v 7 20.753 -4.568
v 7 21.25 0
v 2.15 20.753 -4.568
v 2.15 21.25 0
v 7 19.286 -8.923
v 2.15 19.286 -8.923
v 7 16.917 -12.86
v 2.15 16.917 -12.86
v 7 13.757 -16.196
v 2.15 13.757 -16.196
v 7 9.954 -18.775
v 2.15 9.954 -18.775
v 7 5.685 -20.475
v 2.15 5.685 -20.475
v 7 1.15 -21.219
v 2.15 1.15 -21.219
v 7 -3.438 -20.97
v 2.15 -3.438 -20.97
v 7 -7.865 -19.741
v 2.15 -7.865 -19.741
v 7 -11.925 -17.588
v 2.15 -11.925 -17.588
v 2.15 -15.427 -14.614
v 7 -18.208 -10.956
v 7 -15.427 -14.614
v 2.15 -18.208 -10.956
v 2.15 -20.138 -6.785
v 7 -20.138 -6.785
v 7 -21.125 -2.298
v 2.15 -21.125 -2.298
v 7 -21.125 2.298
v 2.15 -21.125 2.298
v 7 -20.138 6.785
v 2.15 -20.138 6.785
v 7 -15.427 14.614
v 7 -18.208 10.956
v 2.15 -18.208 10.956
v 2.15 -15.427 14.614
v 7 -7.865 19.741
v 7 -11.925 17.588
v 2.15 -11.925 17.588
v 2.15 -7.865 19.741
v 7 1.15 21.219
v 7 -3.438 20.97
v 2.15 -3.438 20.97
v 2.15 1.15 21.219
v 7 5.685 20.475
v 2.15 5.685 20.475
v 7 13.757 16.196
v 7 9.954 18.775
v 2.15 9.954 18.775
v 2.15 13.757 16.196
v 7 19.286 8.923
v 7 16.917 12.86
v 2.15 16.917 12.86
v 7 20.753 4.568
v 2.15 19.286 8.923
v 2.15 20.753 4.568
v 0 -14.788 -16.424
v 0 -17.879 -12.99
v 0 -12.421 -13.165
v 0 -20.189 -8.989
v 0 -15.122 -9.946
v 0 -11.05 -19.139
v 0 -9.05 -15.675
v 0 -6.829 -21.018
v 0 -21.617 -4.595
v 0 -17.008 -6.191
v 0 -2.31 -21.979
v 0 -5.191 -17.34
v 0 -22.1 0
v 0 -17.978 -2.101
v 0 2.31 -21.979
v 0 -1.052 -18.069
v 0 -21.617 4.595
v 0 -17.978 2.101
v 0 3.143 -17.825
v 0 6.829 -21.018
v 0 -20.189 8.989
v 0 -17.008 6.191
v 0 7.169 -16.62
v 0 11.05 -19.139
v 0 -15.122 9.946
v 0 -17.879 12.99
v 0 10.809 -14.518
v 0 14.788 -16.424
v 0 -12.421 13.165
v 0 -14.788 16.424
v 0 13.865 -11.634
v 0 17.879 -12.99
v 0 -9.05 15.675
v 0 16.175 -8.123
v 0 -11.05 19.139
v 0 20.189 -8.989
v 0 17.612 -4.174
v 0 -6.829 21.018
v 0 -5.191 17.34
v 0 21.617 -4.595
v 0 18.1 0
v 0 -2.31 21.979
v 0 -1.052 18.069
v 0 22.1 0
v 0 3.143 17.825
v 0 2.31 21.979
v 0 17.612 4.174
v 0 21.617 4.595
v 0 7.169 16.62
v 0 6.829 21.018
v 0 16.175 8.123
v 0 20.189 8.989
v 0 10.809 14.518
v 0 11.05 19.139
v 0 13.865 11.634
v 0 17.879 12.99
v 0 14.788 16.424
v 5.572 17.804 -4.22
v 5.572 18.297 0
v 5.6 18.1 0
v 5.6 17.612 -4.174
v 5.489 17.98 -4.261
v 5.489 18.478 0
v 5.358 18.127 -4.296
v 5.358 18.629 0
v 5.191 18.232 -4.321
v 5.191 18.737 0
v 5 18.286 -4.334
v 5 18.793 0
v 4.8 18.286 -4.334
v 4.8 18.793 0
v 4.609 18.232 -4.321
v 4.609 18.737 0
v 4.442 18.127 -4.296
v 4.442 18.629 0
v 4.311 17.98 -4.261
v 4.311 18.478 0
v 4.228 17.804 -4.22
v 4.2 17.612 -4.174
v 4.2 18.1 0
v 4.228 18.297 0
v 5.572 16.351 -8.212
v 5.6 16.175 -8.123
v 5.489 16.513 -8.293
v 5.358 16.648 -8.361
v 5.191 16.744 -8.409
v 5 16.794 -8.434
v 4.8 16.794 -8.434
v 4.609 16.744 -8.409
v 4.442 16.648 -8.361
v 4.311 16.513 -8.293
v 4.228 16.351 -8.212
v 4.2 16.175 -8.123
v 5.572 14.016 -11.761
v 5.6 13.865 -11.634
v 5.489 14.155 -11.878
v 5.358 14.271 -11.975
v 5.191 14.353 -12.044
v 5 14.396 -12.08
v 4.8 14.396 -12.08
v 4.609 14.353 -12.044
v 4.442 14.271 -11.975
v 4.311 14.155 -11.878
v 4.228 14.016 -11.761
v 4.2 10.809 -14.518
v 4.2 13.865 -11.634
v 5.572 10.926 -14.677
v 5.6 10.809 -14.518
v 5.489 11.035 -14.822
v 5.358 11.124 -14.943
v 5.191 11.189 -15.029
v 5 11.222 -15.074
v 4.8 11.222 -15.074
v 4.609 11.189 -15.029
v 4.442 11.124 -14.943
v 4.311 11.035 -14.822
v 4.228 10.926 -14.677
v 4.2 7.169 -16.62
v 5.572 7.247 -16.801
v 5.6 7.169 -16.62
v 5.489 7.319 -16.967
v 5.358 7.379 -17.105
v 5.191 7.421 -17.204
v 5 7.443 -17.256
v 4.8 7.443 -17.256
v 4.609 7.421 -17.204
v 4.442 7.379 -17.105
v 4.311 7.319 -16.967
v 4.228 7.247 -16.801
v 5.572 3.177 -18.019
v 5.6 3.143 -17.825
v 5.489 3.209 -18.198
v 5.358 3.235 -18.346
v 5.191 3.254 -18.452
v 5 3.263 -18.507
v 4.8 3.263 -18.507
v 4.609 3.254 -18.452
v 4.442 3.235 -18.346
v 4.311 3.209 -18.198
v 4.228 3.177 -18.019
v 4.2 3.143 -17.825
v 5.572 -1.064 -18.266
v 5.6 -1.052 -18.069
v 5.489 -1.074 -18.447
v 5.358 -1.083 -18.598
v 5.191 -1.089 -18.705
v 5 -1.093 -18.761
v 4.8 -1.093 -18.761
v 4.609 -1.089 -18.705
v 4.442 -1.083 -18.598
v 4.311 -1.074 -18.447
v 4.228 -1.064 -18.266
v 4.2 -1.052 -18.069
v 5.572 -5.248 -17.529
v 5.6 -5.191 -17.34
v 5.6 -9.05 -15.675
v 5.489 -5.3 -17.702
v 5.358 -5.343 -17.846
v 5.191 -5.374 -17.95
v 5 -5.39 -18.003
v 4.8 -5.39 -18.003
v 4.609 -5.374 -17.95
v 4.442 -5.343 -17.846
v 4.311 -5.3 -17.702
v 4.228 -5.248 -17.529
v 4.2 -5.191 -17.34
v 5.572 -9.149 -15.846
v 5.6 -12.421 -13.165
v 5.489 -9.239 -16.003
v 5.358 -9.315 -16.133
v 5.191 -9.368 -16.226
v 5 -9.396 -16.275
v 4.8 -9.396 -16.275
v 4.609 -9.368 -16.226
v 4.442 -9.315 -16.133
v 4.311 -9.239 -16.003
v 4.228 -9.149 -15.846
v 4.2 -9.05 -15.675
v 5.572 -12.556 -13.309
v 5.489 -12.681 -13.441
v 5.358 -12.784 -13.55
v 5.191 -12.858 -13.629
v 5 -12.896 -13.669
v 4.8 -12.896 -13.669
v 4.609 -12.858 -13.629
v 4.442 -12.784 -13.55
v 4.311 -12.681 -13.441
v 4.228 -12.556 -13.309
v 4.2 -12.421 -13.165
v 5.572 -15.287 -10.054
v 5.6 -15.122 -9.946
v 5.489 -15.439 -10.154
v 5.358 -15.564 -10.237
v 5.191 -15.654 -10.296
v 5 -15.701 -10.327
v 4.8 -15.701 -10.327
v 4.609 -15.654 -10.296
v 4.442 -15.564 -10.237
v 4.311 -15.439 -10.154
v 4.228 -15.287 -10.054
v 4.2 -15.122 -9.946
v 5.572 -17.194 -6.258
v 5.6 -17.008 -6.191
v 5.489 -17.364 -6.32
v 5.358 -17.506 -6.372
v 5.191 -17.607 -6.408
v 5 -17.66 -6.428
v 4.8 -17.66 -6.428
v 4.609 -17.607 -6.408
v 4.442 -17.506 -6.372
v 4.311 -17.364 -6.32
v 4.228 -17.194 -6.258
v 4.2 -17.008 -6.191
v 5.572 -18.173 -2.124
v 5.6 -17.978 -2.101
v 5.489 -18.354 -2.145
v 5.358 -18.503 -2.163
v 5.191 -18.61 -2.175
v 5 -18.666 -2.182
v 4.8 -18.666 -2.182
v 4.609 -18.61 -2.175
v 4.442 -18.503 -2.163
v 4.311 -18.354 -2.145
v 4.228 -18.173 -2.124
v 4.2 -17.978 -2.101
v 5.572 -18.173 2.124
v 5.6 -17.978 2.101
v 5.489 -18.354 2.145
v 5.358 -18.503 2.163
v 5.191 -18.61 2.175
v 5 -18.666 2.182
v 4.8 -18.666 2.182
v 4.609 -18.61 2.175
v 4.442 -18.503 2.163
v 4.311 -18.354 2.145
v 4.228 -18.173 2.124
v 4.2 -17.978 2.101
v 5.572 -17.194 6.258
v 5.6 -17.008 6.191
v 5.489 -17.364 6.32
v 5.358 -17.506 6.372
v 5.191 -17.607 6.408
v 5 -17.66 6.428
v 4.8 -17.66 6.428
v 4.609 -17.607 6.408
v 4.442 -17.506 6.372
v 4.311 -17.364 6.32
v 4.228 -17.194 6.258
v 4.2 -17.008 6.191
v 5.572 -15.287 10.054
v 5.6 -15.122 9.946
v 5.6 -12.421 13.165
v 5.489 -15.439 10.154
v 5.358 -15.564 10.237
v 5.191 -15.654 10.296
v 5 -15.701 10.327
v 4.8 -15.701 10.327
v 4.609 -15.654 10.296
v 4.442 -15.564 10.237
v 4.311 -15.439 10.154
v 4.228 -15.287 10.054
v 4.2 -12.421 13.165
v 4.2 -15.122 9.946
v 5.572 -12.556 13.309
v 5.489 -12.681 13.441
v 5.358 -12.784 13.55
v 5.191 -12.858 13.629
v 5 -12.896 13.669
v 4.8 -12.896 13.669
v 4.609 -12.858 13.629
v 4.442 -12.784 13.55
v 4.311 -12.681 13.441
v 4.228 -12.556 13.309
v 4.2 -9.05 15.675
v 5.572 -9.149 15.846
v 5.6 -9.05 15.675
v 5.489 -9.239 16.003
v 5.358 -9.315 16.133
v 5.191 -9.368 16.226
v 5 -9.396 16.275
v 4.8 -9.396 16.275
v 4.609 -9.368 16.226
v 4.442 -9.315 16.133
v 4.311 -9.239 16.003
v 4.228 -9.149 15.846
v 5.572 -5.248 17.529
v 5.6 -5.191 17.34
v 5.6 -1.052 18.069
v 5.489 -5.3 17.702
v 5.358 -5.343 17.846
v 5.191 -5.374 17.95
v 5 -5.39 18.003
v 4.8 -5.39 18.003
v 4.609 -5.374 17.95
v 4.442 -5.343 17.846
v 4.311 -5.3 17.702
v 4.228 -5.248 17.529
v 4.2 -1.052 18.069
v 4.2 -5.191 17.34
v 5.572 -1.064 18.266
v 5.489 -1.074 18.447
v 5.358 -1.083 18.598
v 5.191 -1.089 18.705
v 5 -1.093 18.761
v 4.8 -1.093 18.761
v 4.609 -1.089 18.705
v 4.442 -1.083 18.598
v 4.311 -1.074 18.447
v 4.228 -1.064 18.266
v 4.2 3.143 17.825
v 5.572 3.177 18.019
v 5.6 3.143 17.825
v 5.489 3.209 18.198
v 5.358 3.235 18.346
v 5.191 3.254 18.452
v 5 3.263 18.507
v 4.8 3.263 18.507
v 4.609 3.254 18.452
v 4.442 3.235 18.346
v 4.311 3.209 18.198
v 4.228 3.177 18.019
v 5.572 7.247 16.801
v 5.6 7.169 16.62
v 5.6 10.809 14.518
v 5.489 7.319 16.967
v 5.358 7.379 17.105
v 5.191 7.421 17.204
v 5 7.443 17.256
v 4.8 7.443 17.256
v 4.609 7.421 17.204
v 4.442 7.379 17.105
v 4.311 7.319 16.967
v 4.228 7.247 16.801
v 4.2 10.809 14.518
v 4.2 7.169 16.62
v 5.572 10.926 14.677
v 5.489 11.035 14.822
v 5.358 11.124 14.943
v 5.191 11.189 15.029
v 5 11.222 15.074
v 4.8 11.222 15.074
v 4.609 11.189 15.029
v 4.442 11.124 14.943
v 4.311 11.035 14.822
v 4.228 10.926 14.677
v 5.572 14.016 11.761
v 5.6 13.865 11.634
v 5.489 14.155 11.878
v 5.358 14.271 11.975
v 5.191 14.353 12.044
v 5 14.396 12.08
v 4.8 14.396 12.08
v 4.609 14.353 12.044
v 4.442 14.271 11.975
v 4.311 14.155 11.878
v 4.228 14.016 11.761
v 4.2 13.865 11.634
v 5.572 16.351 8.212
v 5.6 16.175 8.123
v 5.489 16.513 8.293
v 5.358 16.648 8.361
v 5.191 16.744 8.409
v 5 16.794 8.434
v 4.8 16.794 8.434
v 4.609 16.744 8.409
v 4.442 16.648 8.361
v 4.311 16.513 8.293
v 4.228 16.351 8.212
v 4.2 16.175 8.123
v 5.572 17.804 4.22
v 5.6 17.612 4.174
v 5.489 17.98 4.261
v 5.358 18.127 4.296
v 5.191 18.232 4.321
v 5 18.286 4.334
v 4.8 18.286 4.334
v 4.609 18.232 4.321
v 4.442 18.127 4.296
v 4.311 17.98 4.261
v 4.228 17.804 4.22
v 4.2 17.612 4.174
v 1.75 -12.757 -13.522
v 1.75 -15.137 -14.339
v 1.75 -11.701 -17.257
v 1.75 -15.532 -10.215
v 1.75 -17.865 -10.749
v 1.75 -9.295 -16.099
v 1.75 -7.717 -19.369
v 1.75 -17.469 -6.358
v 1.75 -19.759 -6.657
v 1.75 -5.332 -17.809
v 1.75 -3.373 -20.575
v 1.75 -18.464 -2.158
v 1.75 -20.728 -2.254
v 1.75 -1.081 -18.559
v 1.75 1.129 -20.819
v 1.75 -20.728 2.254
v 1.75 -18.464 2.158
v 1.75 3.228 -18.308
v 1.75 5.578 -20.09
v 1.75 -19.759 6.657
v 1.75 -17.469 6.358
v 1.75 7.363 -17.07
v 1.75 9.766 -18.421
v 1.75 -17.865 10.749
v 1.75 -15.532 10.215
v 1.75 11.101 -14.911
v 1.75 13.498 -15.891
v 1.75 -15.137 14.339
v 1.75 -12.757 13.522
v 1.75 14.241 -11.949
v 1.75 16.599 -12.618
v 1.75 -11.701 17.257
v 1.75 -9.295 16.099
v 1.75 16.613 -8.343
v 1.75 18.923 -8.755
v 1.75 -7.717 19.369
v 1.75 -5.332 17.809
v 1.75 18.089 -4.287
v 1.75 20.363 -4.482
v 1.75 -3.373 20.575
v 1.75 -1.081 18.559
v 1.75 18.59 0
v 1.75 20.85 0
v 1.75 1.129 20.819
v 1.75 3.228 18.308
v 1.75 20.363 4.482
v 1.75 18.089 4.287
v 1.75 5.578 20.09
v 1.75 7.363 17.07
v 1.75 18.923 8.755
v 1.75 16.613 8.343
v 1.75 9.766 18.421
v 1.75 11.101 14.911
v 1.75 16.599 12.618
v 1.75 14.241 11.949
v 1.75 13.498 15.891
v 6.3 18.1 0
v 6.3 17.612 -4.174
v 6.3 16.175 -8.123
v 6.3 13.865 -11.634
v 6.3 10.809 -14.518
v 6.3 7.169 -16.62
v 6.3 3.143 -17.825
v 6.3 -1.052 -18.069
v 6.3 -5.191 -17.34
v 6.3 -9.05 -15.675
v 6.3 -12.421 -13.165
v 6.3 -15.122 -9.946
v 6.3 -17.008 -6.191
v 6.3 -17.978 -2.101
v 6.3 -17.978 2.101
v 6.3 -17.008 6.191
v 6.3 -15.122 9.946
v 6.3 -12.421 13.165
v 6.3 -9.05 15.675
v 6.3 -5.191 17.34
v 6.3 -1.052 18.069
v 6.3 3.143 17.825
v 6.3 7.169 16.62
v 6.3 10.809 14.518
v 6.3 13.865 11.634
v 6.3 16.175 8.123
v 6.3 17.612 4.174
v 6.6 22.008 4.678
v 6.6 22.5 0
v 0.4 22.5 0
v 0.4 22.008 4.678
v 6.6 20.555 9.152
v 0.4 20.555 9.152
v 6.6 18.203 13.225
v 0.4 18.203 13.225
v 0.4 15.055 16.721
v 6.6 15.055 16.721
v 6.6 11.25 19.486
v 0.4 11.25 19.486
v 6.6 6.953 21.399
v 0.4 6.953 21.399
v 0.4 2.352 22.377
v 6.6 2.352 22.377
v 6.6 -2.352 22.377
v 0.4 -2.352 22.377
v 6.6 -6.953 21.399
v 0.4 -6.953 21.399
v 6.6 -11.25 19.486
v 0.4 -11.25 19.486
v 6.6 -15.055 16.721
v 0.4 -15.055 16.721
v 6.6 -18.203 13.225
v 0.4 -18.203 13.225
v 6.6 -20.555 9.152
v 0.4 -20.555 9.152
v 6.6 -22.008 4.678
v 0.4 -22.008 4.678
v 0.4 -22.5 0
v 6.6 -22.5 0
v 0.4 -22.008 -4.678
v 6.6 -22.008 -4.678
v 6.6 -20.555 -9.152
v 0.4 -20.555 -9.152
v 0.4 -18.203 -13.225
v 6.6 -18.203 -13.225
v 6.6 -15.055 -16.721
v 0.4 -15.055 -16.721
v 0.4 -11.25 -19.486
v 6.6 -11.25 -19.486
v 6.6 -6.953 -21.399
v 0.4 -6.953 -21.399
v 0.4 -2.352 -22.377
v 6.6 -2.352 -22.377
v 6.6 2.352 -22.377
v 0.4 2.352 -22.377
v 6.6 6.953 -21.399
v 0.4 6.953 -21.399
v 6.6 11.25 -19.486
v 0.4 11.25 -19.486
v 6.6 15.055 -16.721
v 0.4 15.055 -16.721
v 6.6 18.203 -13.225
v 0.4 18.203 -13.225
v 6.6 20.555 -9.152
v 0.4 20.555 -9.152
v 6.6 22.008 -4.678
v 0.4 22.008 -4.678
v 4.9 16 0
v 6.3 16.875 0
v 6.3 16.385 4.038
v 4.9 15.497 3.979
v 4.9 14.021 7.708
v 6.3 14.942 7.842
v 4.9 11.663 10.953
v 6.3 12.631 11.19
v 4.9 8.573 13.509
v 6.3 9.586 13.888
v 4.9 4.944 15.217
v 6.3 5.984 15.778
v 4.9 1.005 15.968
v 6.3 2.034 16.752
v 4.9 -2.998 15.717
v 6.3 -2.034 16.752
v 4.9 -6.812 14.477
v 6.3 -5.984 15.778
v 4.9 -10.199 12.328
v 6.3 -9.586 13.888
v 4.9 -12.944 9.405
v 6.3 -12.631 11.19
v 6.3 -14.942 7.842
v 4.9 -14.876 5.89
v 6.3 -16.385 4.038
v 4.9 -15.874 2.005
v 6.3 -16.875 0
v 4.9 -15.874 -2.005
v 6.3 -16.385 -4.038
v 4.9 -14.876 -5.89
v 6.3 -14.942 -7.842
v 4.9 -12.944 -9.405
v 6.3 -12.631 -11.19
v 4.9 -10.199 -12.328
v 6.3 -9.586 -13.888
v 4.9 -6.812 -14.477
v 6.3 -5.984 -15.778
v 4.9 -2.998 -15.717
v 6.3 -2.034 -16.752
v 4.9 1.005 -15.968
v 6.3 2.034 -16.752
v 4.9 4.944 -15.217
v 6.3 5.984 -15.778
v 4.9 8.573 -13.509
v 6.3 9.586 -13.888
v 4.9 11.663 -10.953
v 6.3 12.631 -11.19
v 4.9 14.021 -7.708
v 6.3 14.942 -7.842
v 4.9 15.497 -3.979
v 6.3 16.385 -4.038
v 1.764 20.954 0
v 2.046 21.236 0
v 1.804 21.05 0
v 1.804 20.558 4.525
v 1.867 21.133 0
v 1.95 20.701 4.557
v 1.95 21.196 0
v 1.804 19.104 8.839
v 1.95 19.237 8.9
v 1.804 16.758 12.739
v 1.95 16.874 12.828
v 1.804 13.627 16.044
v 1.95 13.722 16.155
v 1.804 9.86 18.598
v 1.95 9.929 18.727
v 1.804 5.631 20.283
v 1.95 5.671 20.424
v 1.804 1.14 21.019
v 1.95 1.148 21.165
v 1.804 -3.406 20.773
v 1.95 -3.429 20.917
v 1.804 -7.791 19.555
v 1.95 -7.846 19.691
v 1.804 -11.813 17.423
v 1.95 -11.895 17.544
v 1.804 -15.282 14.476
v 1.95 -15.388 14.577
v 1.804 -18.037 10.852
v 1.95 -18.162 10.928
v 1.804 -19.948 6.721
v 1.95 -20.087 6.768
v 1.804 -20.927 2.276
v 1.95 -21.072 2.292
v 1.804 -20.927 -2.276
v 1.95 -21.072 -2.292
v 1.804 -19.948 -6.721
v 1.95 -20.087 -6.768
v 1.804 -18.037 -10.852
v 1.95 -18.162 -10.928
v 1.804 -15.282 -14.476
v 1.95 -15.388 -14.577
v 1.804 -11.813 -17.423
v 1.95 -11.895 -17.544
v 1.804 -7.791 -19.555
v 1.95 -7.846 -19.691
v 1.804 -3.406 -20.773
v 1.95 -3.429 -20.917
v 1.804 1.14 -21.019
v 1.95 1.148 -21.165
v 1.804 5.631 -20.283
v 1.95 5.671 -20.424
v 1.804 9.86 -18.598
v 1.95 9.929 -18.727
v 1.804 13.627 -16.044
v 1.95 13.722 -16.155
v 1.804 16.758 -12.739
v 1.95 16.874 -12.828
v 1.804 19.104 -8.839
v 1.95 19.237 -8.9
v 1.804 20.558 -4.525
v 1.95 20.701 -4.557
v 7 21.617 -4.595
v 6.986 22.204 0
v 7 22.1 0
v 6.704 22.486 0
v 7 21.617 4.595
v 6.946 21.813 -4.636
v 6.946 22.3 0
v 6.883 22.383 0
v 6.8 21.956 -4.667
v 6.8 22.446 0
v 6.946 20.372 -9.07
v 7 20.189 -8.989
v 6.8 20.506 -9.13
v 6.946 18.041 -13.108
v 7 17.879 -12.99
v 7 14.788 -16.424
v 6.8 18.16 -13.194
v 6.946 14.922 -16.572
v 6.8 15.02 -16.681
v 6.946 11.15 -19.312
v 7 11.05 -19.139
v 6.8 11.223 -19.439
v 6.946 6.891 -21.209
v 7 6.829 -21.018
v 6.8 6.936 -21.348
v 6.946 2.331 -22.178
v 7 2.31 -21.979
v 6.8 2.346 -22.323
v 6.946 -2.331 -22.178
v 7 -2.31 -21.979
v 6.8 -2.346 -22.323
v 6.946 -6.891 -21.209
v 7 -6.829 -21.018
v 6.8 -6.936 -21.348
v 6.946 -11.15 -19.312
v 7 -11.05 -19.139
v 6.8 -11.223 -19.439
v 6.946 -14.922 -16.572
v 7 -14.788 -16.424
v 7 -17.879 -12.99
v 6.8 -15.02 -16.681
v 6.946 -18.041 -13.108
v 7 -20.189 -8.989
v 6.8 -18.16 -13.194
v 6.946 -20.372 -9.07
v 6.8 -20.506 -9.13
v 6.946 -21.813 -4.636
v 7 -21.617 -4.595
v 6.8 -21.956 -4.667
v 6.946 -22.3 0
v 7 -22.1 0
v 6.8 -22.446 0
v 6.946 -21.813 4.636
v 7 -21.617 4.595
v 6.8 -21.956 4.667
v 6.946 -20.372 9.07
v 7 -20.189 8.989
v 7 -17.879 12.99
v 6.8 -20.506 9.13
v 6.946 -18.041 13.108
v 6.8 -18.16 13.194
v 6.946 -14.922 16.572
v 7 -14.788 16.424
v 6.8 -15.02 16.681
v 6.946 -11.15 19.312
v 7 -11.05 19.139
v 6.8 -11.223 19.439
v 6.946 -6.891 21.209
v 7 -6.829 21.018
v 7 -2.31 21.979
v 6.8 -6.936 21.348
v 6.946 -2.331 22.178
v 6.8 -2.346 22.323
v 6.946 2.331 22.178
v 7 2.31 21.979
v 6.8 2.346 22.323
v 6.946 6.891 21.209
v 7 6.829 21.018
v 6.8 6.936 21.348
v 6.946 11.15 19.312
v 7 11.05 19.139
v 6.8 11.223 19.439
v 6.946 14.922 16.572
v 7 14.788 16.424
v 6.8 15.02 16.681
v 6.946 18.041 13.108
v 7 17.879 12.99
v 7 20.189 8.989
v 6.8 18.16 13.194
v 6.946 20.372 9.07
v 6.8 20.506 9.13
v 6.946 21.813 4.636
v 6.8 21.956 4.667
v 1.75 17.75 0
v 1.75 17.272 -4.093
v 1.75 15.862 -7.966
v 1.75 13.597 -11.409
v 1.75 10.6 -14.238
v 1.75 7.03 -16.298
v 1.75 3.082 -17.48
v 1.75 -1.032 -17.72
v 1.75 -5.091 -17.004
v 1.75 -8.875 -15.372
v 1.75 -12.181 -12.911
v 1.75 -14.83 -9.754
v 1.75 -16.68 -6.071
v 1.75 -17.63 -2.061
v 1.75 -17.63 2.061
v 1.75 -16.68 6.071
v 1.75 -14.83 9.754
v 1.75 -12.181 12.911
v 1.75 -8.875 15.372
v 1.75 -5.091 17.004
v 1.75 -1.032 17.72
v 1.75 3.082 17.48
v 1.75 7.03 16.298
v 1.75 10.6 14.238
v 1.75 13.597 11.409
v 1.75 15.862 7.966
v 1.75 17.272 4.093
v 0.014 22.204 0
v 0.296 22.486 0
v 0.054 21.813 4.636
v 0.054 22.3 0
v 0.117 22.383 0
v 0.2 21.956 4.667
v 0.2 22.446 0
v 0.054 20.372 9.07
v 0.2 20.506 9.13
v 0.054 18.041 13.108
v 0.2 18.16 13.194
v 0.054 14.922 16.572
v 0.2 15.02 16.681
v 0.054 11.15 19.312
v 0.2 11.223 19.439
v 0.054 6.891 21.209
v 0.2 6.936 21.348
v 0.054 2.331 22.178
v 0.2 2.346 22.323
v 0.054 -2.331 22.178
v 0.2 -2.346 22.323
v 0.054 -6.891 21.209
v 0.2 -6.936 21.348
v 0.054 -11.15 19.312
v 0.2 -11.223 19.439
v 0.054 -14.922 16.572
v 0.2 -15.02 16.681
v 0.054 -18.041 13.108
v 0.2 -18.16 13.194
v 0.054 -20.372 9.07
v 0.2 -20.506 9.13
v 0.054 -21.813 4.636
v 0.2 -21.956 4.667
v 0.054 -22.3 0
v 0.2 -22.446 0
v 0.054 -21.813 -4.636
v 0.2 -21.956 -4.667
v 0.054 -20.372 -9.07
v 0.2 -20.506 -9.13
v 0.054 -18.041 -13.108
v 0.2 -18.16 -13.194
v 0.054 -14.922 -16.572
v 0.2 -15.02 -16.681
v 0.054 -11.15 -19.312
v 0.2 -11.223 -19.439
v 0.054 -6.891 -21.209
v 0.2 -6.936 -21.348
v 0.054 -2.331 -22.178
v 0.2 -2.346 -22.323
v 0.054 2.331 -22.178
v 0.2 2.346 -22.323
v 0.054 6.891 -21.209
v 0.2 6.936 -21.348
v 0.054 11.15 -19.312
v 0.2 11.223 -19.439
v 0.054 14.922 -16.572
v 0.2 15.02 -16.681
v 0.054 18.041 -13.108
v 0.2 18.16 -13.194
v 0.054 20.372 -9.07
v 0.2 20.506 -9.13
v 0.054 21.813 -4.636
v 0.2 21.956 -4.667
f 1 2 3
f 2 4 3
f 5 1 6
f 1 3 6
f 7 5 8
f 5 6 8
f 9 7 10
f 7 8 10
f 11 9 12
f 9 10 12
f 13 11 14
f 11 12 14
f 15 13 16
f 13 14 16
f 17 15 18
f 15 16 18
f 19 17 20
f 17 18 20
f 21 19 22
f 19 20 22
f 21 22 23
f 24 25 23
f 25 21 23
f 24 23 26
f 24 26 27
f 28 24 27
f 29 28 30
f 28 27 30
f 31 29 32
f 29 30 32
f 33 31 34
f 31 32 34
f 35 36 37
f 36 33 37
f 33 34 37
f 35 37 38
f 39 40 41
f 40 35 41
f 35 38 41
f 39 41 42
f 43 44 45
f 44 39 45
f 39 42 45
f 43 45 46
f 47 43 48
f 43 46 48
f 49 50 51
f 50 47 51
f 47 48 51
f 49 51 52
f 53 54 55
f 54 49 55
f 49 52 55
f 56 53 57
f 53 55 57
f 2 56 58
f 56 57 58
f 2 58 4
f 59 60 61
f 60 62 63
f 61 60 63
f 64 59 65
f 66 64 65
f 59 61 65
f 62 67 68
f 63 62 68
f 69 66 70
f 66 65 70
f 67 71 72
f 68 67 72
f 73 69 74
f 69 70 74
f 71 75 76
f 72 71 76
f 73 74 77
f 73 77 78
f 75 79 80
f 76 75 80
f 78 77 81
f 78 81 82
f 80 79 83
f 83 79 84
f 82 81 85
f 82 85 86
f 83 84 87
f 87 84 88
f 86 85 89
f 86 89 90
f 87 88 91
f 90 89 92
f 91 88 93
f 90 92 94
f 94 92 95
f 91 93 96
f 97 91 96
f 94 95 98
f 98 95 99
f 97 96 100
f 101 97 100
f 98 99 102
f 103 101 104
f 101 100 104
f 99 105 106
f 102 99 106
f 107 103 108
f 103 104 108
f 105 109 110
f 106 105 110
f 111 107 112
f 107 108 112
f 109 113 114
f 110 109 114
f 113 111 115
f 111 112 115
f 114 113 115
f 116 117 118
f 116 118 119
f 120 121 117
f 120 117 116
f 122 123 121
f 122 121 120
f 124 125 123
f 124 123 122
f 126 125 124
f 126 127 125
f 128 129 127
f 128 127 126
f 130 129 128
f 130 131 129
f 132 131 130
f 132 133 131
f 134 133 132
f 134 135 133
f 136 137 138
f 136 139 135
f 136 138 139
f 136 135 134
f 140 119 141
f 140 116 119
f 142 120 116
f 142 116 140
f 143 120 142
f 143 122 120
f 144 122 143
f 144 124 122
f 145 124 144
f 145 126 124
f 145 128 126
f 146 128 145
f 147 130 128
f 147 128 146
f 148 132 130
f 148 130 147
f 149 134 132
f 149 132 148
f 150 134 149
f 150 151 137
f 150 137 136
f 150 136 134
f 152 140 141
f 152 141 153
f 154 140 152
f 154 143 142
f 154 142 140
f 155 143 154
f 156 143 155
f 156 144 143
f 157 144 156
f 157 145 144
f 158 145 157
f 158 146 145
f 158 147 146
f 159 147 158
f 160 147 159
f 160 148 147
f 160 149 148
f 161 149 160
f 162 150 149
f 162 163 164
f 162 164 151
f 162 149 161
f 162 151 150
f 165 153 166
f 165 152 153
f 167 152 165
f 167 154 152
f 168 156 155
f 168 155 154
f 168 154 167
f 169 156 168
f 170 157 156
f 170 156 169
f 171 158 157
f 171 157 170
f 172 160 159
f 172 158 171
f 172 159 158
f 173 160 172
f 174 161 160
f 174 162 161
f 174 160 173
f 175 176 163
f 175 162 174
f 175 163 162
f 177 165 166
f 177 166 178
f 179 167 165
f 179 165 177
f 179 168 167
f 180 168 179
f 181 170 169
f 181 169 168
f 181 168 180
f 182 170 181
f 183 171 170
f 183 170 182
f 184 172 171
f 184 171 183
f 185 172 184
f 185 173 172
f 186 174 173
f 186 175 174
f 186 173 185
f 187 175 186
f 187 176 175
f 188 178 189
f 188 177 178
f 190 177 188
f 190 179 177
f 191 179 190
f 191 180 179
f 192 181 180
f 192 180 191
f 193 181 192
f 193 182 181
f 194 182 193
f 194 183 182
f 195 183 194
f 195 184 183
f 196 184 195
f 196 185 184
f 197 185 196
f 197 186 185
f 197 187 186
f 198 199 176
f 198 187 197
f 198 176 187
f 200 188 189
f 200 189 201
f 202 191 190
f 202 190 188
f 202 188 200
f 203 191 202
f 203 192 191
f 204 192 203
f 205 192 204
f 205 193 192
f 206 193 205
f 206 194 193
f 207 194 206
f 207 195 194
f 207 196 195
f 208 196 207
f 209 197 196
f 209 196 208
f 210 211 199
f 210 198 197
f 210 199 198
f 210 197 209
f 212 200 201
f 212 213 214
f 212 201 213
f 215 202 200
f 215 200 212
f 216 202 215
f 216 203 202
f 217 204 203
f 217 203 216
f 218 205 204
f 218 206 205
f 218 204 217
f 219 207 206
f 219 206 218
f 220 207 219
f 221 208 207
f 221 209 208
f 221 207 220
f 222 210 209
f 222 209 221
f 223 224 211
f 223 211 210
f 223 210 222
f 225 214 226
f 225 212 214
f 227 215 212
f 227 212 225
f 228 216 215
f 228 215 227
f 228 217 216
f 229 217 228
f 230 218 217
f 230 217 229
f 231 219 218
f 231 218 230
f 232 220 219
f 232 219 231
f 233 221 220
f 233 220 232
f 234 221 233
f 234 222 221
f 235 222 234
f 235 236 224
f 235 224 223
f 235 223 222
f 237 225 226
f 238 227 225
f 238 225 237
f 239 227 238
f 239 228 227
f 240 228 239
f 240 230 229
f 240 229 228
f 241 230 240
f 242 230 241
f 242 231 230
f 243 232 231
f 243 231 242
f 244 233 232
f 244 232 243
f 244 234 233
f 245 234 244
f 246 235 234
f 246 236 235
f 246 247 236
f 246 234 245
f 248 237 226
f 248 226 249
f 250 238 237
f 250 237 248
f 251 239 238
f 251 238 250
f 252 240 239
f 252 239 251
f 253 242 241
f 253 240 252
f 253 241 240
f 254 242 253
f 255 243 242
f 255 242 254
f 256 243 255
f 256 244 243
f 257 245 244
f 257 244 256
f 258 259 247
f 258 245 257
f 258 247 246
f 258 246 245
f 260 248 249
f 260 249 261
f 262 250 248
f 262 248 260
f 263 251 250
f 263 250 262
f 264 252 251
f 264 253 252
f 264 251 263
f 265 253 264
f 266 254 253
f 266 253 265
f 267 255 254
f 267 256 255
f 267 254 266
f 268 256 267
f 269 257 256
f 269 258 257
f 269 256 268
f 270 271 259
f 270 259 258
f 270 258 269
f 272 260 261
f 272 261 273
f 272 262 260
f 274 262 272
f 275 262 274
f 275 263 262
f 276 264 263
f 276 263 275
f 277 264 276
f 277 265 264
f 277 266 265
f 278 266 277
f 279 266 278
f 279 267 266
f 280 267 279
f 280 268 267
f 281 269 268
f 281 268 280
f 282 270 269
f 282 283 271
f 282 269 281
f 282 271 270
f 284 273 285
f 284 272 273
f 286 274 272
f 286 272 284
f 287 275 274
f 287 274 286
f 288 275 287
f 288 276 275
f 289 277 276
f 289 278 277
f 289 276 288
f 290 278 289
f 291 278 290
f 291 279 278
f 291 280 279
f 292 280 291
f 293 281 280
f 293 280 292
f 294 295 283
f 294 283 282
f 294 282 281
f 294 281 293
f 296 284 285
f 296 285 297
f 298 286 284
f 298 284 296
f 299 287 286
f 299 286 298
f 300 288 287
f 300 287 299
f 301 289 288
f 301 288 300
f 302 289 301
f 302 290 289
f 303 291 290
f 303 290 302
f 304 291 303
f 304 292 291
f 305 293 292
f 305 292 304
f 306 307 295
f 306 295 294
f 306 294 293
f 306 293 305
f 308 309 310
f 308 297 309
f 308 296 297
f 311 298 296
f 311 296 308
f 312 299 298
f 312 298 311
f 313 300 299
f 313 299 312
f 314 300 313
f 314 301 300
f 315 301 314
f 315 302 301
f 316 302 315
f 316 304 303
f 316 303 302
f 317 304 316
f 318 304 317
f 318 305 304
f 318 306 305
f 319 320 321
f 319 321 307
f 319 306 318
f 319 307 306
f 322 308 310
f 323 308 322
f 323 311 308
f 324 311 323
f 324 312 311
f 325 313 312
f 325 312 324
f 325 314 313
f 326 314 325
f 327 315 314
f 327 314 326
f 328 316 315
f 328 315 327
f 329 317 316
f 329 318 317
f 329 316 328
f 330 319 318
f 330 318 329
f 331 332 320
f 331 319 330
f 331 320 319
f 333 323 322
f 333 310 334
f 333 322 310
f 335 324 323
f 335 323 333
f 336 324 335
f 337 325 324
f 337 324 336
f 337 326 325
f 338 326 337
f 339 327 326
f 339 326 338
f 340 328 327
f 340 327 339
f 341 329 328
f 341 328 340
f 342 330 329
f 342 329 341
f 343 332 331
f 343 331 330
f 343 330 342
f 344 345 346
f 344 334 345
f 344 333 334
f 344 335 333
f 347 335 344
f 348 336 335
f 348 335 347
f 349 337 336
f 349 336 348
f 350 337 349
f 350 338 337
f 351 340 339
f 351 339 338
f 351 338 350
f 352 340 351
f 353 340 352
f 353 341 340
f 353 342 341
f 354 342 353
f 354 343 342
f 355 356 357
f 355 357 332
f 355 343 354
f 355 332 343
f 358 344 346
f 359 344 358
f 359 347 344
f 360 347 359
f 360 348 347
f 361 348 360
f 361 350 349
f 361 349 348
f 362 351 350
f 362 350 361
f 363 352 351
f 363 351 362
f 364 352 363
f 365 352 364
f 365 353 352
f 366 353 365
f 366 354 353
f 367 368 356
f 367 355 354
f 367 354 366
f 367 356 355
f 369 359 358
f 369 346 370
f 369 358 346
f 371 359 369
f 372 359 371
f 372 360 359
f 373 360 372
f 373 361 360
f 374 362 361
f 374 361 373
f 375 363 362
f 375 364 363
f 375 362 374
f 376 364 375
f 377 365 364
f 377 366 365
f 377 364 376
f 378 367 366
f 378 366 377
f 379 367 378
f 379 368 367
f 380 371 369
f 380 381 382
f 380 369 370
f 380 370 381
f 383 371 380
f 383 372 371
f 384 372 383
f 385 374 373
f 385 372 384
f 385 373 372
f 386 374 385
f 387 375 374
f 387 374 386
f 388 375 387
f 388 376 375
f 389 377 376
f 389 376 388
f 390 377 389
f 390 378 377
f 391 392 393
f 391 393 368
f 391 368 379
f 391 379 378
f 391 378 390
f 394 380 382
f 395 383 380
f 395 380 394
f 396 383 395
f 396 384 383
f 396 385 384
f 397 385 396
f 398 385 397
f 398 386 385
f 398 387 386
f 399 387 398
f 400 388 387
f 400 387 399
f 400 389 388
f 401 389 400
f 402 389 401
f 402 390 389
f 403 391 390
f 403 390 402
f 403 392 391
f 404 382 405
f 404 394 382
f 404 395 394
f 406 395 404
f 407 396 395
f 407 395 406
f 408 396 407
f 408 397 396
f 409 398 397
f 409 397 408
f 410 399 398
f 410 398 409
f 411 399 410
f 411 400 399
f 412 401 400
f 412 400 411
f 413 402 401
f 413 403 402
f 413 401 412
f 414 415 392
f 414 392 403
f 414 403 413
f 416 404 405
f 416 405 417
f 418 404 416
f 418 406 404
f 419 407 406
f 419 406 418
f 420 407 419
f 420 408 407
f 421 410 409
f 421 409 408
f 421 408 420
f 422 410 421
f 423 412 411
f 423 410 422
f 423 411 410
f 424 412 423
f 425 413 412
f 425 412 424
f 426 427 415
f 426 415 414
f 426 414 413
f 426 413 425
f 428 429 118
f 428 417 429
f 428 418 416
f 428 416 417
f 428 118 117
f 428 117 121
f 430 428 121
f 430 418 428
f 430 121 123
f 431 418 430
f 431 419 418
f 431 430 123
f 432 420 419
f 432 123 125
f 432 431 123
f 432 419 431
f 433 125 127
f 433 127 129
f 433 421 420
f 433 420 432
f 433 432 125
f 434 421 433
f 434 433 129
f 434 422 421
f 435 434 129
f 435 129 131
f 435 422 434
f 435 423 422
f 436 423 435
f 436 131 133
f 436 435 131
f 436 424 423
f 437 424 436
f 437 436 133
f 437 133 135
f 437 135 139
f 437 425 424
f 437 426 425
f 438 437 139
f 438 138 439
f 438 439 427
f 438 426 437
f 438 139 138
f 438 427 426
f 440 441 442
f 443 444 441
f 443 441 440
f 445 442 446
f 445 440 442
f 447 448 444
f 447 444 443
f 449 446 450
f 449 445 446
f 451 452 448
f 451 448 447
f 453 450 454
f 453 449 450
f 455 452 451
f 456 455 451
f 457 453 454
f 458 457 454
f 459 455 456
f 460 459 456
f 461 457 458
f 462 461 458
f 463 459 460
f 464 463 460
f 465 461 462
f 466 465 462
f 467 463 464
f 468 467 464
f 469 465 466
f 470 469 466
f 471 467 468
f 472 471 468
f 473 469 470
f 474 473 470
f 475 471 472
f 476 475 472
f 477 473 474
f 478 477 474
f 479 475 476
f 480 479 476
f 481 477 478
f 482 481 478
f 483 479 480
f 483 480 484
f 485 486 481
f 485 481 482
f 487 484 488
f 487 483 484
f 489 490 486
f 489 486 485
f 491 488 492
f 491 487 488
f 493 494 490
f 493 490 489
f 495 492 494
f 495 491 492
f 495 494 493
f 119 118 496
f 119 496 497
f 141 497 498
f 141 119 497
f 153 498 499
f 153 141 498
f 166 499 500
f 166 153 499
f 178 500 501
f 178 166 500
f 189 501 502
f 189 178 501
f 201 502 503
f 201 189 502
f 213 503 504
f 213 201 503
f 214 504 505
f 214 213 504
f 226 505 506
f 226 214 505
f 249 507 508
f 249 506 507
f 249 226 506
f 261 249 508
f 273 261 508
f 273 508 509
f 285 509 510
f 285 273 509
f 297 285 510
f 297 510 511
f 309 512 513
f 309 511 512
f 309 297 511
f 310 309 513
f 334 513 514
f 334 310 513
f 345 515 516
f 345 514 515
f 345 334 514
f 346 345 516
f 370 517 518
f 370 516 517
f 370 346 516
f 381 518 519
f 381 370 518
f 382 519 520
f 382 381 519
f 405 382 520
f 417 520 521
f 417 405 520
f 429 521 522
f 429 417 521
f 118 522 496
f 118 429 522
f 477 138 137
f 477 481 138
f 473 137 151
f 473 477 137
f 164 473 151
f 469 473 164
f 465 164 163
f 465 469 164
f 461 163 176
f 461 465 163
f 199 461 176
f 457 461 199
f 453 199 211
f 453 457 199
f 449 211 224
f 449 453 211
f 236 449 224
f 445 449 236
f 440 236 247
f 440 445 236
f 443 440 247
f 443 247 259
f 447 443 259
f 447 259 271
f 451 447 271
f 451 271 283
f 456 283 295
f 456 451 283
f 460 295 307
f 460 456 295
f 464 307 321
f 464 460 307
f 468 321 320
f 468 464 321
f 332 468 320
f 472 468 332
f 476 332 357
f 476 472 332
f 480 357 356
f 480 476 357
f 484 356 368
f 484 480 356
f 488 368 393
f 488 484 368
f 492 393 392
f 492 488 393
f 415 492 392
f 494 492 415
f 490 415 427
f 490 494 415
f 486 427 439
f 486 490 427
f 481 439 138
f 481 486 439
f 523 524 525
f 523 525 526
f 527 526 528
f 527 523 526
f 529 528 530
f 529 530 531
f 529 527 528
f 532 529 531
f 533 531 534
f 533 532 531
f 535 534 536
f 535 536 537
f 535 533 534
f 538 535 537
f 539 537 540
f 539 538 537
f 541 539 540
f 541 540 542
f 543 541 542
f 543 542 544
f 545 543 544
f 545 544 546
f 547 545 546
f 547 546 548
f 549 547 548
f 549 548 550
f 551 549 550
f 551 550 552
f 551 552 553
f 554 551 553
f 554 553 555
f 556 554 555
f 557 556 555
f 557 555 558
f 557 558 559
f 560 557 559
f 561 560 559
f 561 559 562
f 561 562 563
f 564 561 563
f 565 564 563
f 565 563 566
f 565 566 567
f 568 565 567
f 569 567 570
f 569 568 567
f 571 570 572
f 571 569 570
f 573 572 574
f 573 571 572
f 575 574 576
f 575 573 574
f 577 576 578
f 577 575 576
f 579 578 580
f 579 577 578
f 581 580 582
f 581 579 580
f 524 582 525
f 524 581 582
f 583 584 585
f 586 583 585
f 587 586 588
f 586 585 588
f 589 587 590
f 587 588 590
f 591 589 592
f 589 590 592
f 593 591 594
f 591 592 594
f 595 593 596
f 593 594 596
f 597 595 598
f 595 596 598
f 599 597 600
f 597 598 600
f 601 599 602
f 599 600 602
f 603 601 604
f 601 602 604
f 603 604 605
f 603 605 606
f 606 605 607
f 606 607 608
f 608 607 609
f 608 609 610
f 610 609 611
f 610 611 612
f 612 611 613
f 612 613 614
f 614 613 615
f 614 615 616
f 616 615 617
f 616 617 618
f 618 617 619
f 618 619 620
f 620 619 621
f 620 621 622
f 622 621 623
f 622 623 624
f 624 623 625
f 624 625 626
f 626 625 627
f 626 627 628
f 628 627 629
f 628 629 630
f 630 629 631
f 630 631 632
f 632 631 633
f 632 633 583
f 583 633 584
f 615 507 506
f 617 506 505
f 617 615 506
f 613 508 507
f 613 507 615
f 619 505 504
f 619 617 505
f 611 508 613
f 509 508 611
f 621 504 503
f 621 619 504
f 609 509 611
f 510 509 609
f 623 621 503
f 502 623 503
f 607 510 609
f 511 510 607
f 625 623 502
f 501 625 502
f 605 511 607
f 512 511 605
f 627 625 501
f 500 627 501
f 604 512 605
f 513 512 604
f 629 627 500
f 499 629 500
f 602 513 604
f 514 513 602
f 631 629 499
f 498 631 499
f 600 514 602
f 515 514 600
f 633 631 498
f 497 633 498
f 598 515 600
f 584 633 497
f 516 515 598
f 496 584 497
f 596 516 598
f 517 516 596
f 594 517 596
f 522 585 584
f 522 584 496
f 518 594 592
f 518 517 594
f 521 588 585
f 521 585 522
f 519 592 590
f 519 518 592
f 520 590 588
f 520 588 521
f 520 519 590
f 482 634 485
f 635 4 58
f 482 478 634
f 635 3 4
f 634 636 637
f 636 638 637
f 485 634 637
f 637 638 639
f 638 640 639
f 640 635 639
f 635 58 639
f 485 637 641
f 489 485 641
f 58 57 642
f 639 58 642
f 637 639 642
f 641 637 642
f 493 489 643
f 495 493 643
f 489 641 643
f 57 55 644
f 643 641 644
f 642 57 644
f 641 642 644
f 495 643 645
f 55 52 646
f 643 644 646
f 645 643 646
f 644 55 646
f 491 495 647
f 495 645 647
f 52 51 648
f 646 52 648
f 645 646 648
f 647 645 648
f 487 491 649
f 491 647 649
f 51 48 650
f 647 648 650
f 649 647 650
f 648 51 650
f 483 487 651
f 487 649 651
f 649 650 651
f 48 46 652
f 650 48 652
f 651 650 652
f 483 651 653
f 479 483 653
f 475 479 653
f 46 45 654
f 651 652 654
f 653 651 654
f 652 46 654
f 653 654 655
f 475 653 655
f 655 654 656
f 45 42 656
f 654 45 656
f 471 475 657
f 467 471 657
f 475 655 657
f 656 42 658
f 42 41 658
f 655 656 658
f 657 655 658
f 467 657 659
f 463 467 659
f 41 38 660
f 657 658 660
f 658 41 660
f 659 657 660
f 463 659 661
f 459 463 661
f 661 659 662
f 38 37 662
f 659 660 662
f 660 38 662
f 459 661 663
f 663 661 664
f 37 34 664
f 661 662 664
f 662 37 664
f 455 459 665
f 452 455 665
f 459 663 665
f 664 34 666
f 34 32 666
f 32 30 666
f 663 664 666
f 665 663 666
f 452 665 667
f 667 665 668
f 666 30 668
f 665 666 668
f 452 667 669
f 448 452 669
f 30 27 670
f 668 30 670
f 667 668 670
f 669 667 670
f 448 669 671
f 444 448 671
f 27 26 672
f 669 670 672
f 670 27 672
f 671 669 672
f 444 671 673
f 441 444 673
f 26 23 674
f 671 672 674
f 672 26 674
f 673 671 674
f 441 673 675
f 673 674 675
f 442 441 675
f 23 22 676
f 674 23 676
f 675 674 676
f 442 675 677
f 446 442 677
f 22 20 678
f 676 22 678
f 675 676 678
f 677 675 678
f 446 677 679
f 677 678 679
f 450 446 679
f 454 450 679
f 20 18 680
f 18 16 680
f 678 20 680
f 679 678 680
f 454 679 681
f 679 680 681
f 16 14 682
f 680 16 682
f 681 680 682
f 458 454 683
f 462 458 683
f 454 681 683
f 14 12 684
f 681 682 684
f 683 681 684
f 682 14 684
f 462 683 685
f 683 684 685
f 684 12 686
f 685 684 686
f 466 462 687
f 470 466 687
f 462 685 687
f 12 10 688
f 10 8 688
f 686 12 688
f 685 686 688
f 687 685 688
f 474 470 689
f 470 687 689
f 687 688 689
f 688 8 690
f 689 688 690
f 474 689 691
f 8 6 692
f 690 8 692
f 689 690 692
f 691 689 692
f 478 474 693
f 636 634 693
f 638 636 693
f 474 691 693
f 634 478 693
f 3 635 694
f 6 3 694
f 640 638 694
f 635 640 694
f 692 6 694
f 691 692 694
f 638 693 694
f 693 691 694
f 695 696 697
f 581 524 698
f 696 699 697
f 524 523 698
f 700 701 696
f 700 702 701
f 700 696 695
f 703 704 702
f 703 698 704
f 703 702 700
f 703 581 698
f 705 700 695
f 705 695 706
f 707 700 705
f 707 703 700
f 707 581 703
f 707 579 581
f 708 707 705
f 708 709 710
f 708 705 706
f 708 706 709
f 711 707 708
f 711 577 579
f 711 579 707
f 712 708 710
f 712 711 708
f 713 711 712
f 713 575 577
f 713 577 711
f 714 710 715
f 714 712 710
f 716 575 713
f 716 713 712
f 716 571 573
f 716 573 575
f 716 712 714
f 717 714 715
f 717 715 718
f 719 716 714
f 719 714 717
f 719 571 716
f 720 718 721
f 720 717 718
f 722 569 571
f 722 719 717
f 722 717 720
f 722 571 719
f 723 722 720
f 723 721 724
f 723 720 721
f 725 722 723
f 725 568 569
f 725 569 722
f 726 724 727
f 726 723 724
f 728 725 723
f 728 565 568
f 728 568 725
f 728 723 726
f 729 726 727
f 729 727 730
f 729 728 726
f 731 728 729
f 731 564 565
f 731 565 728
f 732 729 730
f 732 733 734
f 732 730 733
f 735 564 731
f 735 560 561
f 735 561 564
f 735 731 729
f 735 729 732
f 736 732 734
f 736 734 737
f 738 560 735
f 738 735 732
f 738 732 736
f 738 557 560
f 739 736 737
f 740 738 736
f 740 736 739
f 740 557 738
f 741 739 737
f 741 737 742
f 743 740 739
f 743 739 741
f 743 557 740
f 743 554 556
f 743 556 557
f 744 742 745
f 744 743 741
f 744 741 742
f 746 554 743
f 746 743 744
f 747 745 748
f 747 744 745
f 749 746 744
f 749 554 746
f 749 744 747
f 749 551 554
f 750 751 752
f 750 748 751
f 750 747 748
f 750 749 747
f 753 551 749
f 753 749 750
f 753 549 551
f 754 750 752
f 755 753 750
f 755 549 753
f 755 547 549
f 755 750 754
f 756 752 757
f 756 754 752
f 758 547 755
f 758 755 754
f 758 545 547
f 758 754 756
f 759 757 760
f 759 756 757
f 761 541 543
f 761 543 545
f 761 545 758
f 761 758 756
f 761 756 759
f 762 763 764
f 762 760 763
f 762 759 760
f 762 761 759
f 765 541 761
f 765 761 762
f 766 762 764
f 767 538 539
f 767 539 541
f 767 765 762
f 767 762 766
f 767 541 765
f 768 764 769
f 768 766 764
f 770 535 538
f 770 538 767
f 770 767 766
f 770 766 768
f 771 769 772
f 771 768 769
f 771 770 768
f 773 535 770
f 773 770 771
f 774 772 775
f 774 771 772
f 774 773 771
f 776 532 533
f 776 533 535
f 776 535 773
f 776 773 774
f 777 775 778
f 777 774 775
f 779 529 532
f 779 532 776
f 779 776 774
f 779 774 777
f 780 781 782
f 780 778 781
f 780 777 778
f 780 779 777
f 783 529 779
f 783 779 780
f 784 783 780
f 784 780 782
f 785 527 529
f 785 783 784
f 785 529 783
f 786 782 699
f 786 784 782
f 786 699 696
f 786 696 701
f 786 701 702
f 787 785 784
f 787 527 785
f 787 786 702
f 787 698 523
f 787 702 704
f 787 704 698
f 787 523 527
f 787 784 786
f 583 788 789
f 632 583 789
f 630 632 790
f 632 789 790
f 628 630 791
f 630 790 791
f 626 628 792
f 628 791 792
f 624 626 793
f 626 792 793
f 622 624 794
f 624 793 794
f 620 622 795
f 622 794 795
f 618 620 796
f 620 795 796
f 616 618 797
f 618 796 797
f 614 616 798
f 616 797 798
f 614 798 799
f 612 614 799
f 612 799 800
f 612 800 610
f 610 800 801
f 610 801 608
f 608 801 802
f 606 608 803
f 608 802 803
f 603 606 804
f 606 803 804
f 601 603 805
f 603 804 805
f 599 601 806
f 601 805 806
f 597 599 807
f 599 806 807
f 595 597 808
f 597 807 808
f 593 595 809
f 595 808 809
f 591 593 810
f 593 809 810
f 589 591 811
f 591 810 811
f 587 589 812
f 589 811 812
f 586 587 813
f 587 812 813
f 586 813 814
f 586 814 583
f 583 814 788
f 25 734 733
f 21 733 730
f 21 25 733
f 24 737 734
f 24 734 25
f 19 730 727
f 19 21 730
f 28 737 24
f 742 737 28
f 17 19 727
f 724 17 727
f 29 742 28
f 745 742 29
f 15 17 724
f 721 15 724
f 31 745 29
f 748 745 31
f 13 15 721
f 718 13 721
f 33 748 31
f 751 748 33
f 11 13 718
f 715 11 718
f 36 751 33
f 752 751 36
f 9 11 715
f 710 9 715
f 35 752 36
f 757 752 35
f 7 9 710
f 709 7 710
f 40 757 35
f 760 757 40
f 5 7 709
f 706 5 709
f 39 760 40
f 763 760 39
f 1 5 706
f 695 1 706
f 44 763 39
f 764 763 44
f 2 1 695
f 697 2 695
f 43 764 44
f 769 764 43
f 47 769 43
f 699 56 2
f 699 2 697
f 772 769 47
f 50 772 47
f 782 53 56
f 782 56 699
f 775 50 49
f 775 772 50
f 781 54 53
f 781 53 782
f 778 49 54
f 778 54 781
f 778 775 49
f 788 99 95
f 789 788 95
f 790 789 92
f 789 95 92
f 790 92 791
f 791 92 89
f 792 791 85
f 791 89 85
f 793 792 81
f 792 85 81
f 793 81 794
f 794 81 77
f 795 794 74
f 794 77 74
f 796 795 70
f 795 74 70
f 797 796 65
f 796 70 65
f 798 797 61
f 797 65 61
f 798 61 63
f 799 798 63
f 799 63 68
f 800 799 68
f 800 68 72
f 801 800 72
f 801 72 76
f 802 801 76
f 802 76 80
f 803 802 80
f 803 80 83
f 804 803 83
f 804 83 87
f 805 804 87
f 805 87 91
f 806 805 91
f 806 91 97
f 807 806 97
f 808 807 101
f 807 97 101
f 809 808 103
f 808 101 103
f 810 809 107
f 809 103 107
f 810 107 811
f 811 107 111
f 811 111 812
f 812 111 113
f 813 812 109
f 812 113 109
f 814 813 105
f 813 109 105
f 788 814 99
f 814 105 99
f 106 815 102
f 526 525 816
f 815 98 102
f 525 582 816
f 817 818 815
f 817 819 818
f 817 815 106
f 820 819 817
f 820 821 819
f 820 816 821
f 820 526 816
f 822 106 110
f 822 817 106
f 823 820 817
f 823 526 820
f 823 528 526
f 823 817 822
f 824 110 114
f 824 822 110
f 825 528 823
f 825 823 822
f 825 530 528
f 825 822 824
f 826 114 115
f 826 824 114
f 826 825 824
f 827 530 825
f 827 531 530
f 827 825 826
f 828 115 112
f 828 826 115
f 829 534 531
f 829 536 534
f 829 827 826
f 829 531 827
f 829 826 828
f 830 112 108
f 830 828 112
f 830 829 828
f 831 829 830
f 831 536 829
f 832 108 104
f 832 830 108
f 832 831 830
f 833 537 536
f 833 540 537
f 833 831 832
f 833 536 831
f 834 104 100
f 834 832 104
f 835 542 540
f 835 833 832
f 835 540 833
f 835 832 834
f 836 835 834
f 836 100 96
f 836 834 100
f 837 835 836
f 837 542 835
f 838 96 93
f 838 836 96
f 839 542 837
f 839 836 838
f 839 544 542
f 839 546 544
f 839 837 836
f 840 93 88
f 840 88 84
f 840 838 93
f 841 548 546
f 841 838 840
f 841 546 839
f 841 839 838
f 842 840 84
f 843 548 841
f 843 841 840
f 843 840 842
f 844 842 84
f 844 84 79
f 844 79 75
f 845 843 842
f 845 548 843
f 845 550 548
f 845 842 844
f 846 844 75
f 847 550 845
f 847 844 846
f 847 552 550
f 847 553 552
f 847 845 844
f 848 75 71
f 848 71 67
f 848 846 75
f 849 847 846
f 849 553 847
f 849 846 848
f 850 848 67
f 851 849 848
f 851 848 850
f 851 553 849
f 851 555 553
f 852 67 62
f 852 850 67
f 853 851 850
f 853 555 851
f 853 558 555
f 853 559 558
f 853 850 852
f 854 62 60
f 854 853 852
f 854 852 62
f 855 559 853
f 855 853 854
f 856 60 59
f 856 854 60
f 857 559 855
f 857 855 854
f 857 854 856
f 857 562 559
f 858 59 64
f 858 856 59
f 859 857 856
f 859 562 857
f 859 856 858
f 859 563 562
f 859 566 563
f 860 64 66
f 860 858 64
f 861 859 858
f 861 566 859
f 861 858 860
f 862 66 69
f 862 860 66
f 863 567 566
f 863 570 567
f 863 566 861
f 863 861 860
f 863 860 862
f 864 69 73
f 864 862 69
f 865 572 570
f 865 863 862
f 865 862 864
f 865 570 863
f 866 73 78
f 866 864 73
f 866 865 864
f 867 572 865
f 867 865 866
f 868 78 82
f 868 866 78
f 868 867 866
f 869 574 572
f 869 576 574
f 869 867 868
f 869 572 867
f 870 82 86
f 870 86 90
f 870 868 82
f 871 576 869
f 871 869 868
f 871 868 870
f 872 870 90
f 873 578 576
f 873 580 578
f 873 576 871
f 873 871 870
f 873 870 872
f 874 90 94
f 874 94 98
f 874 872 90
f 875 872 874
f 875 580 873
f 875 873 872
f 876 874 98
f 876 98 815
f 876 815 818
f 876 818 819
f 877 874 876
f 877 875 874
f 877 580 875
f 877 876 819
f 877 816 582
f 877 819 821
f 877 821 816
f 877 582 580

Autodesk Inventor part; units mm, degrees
ref_plane "YZ Plane" through (0, 0, 0) normal (1, 0, 0) x (0, 1, 0)
ref_plane "XZ Plane" through (0, 0, 0) normal (0, 1, 0) x (-1, 0, 0)
ref_plane "XY Plane" through (0, 0, 0) normal (0, 0, 1) x (1, 0, 0)
sketch "Эскиз1" plane through (0, 0, 0) normal (0, 0, 1) x (1, 0, 0)
  circle A0 centre (4.9, 18.1) radius 0.455
  circle A1 centre (4.9, 18.1) radius 0.7
  line L0 (6.3, 16.875) -> (6.3, 18.1)
  line L1 (0, 22.5) -> (7, 22.5)
  line L2 (7, 22.5) -> (7, 21.25)
  line L3 (7, 21.25) -> (1.75, 21.25)
  line L4 (0, 0) -> (9.5856, 0)
  line L5 (0, 22.5) -> (0, 18.1)
  line L6 (0, 18.1) -> (1.75, 17.75)
  line L7 (1.75, 17.75) -> (4.9, 16)
  line L8 (4.9, 16) -> (6.3, 16.875)
  line L9 (4.9, 16) -> (0, 16) construction
  line L10 (0, 18) -> (0, -3) projected
  line L11 (-1.9171, 0) -> (11.5027, 0) projected
  line L12 (4.2, 18.1) -> (1.75, 18.59)
  line L13 (1.75, 18.59) -> (1.75, 21.25)
  line L14 (6.3, 18.1) -> (5.6, 18.1)
  dimension "d0" = 45
  dimension "d1" = 33.75
  dimension "d2" = 1.25
  dimension "d3" = 0.91
  dimension "d4" = 1.4
  dimension "d5" = 32
  dimension "d6" = 35.5
  dimension "d7" = 36.2
  dimension "d8" = 4.9
  dimension "d9" = 6.3
  dimension "d10" = 7
  dimension "d12" = 1.75
revolve "Базовый элемент" add sketch "Эскиз1" angle 360 about axis through (0, 0, 0) along (1, 0, 0) contours L14 L0 L8 L7 L6 L5 L1 L2 L3 L13 L12 A1
revolve "Пружинные1" add sketch "Эскиз1" angle 360 about axis through (0, 0, 0) along (1, 0, 0) contours A0 | A1
fillet "Сопряжение1" radius 0.4 3 edges at (7, -22.5, 0) (1.75, -21.25, 0) (0, -22.5, 0)
equation "\"d0\" = SD2"
equation "\"d1\" = ABDM"
equation "\"d3\" = SPDI"
equation "\"d4\" = SPDA"
equation "\"d5\" = NND"
equation "\"d6\" = TKDM"
equation "\"d7\" = HLDM"
equation "\"d8\" = SPDST"
equation "\"d9\" = SDI"
equation "\"d10\" = SWDT"
equation "\"d12\" = SD"
equation "\"d11\" = RR"
equation "\"SD2\" = 45"
equation "\"SWDT\" = 7"
equation "\"RR\" = 0.4"
equation "\"SD\" = 1.75"
equation "\"NND\" = 32"
equation "\"SPDA\" = 1.4"
equation "\"SPDI\" = 0.91"
equation "\"TKDM\" = 35.5"
equation "\"HLDM\" = 36.2"
equation "\"ABDM\" = 33.75"
equation "\"SDI\" = 6.3"
equation "\"SPDST\" = 4.9"
equation "\"LAB\" = 0.35"
properties part number "Манжет 1-32x45x7 ГОСТ 8752-79" material "Резина"
